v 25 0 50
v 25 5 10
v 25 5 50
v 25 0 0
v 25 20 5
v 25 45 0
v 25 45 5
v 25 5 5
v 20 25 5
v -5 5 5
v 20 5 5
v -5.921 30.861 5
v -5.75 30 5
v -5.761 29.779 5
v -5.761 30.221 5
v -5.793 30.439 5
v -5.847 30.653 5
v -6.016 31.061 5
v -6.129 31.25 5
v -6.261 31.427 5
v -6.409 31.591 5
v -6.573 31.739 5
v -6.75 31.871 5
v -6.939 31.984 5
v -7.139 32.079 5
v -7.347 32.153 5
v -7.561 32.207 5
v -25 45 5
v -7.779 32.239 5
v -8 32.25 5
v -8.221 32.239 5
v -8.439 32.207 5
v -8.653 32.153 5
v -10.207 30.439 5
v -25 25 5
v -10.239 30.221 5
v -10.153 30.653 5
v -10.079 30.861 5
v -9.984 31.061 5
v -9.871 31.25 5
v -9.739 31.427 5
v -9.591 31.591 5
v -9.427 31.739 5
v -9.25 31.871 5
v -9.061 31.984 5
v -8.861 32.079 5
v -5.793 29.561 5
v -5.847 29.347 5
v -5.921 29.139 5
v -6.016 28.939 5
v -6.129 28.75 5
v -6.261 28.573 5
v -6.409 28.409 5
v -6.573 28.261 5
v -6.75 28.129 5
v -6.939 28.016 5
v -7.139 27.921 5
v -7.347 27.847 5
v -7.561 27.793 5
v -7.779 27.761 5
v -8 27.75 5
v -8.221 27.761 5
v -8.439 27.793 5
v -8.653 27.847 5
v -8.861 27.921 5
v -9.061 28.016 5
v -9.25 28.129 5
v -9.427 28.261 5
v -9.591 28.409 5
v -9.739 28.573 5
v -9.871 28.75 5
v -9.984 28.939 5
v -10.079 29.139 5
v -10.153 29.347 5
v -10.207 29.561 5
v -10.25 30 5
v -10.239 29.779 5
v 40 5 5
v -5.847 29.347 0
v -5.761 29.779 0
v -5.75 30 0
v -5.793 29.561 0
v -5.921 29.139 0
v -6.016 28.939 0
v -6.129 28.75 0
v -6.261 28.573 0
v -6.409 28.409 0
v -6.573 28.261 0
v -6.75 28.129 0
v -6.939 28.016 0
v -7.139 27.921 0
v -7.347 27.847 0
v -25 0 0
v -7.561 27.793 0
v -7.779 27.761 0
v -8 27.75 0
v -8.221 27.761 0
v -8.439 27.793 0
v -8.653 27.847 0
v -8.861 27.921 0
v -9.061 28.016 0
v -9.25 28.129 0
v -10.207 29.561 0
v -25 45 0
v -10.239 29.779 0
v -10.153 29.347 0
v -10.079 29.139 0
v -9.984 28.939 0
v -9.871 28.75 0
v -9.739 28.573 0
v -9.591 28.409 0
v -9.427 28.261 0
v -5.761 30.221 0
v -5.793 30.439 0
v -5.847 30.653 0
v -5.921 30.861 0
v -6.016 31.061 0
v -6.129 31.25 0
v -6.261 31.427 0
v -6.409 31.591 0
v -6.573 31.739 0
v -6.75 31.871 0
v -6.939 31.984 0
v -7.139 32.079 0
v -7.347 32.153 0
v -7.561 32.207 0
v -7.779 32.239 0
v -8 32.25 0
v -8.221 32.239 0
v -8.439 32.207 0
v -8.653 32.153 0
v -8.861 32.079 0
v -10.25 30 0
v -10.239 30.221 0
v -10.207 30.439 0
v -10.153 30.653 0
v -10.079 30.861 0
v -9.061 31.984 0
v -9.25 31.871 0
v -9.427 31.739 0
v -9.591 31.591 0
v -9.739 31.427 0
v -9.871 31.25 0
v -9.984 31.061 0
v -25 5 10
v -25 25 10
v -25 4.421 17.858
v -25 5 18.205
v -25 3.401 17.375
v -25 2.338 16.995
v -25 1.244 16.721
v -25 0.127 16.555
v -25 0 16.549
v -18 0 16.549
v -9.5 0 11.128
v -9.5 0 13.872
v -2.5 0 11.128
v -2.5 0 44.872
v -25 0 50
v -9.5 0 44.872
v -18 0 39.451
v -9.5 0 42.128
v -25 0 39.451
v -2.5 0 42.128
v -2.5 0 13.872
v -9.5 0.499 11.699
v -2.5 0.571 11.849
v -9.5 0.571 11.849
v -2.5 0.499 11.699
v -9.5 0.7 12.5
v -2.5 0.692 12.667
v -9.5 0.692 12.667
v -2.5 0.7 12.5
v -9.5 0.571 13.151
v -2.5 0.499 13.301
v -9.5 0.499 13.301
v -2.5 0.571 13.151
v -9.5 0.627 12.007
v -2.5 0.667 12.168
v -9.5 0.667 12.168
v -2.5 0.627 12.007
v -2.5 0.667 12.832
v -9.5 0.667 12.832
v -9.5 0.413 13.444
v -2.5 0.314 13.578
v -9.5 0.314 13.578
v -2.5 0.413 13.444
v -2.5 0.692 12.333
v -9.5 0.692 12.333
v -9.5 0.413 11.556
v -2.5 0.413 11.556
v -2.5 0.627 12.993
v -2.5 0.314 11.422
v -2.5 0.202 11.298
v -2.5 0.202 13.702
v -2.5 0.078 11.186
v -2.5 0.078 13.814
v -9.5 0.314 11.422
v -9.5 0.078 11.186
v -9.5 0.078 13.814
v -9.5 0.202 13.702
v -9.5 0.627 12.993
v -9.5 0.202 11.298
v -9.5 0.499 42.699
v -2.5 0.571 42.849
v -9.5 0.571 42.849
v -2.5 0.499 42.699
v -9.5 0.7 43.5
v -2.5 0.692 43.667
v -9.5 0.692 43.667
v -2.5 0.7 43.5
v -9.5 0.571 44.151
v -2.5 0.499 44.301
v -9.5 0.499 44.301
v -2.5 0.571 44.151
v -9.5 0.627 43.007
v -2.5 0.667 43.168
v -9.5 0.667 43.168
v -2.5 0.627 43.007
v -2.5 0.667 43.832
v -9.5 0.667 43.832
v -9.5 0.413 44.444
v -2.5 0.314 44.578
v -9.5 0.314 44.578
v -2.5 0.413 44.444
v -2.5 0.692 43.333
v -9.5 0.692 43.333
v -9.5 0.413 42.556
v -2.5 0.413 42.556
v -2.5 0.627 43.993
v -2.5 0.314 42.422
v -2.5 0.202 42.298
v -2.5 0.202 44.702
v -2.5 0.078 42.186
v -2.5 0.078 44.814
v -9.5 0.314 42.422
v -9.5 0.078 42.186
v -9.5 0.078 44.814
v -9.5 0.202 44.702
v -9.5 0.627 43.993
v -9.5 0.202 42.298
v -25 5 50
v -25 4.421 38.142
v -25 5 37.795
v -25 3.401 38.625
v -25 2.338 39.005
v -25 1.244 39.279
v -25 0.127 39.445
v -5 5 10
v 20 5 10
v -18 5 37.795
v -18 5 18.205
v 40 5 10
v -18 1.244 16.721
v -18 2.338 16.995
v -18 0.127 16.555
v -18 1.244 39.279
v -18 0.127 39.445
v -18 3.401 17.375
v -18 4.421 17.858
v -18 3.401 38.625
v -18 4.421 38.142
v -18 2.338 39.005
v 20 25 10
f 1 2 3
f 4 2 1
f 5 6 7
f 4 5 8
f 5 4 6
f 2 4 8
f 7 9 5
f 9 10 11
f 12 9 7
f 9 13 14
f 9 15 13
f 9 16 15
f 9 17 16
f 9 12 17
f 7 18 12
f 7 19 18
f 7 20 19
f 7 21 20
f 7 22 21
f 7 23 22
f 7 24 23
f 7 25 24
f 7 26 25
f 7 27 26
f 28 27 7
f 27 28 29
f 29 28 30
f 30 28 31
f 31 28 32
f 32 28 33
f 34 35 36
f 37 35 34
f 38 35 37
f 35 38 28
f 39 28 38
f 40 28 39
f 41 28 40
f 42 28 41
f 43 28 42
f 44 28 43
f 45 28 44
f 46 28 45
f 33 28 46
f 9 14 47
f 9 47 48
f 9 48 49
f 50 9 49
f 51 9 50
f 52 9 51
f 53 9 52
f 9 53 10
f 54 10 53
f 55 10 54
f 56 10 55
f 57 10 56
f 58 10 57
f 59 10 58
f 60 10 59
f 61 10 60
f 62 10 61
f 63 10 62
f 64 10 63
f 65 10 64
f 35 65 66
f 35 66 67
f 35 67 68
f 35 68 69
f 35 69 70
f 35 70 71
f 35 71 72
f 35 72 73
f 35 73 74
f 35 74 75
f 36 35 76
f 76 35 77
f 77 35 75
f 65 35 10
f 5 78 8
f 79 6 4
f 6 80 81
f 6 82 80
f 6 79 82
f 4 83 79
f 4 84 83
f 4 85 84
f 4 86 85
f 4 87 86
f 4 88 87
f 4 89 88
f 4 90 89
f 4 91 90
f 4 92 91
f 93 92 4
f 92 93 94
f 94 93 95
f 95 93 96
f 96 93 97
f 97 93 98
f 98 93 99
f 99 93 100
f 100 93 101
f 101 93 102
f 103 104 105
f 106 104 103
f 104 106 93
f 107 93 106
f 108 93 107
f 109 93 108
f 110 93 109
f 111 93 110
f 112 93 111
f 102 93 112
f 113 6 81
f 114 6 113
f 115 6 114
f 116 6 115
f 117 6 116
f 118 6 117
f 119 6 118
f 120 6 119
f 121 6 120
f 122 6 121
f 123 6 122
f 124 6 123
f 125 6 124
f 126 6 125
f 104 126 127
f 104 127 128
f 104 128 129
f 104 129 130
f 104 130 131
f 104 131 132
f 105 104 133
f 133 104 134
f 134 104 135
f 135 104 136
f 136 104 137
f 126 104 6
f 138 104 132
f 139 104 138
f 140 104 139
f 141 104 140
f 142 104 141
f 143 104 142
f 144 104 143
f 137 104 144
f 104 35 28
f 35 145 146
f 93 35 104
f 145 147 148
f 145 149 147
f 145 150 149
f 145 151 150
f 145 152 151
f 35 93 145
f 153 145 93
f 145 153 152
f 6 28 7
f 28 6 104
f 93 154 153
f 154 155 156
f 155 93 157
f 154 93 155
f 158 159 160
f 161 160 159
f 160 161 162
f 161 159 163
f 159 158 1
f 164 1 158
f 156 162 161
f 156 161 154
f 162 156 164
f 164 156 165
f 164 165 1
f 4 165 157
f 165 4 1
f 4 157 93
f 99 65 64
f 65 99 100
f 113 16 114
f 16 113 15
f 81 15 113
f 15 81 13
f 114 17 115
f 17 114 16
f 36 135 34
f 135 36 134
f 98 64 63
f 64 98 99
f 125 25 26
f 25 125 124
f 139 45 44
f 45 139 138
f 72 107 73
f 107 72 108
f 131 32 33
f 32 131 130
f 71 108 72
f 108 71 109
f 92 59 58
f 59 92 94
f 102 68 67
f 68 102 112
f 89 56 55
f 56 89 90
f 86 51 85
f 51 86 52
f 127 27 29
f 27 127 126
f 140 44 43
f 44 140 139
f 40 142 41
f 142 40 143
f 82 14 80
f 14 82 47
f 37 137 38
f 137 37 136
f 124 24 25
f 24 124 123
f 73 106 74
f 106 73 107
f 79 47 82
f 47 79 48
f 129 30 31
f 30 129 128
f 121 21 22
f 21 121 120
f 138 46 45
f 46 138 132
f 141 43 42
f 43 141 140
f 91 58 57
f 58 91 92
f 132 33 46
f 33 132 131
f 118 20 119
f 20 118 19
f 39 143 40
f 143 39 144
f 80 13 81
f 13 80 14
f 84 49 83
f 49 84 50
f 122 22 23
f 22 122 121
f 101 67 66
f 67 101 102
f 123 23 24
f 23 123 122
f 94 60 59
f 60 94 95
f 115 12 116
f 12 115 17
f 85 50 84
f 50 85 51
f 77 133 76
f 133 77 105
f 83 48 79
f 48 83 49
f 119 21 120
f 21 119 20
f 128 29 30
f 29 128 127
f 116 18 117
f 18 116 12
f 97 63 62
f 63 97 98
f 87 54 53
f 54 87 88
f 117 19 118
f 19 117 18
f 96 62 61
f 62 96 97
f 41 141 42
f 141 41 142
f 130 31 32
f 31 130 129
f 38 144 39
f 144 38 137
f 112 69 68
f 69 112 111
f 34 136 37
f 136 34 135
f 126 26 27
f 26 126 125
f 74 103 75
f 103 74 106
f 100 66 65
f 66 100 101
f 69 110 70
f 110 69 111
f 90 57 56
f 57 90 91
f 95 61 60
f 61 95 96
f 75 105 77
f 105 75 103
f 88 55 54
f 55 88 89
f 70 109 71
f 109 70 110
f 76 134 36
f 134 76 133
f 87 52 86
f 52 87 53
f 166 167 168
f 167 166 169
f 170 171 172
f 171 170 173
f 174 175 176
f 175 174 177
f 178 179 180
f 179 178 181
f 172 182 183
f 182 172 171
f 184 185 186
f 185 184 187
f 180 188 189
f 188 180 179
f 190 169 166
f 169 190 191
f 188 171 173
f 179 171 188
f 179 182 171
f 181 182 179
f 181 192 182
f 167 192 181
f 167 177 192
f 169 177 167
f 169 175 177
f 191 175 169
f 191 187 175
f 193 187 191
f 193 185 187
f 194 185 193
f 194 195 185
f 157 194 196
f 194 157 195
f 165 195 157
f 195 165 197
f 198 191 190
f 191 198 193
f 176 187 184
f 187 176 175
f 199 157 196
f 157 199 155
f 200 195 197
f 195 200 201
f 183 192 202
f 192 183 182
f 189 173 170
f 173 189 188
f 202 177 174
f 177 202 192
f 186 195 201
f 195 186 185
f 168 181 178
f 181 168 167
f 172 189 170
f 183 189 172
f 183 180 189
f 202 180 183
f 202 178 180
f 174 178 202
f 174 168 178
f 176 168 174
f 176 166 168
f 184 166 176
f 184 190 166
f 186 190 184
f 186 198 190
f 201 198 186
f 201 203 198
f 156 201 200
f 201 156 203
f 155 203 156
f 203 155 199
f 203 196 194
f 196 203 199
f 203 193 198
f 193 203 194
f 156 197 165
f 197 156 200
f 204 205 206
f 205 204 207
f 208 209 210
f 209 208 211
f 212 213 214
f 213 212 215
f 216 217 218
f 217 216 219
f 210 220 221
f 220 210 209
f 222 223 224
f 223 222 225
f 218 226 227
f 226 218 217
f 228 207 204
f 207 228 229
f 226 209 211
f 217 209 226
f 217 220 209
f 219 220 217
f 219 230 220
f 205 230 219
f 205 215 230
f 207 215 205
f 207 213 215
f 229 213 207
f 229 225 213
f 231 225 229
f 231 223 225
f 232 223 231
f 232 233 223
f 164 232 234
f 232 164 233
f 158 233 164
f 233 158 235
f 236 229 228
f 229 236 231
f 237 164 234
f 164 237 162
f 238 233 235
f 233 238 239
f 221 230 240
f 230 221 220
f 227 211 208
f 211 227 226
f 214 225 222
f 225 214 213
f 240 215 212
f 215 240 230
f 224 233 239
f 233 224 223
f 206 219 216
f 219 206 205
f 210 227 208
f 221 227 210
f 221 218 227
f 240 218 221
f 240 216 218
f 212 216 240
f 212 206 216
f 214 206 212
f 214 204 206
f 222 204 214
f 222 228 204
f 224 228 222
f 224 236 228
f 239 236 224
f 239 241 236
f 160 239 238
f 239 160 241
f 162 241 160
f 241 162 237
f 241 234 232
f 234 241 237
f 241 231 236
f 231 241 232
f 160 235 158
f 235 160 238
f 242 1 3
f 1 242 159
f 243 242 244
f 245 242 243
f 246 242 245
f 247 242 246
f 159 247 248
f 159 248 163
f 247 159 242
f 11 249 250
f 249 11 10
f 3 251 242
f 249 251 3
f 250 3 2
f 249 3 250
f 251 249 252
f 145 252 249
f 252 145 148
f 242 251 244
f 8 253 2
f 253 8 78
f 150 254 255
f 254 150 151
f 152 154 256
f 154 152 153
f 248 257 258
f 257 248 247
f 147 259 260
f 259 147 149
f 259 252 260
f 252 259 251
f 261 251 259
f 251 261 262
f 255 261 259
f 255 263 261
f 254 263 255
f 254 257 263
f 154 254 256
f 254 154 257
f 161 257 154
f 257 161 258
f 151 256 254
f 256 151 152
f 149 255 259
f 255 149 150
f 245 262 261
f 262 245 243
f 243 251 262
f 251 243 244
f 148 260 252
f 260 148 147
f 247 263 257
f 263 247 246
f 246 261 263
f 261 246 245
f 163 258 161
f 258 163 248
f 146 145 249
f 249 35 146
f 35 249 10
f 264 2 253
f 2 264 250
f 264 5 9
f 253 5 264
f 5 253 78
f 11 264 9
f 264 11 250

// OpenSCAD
// NEMA 17 Stepper Motor L-Bracket for Syringe Pump
// Corrected to match exact dimensions and centering requirements

// --- Dimensions ---
// Base Plate
base_x_min = -25;
base_x_max = 25;
base_y_min = 0;
base_y_max = 45;
base_z_height = 5;

// Base Plate Holes (M4)
m4_hole_dia = 4.5;
m4_hole_x1 = -17;
m4_hole_x2 = 17;
m4_hole_y = 30;

// Vertical Motor Plate
motor_plate_x_min = -25;
motor_plate_x_max = 25;
motor_plate_y_max = 5;
motor_plate_z_max = 50;

// Motor Boss Hole (Centering)
boss_hole_dia = 23;
boss_hole_x = 0;
boss_hole_z = 28;

// Motor Screw Holes (M3)
m3_hole_dia = 3.4;
m3_pattern_size = 31;
m3_offset = m3_pattern_size / 2;

// Gussets
gusset_thickness = 5;
gusset_leg_y = 20;
gusset_leg_z = 20;

// Resolution
$fn = 64;

// --- Construction ---

module base_plate() {
    difference() {
        // Main Base Body
        // X: -25 to 25 (width 50), Y: 0 to 45 (depth 45), Z: 0 to 5
        cube([base_x_max - base_x_min, base_y_max - base_y_min, base_z_height]);
        
        // M4 Holes (Vertical through-holes)
        // Holes are at x = -17 and x = 17, y = 30
        translate([m4_hole_x1, m4_hole_y, -1])
            cylinder(d = m4_hole_dia, h = base_z_height + 2);
        translate([m4_hole_x2, m4_hole_y, -1])
            cylinder(d = m4_hole_dia, h = base_z_height + 2);
    }
}

module motor_plate() {
    difference() {
        // Main Vertical Plate Body
        // X: -25 to 25 (width 50), Y: 0 to 5 (depth 5), Z: 0 to 50
        cube([motor_plate_x_max - motor_plate_x_min, motor_plate_y_max, motor_plate_z_max]);
        
        // Motor Centering Boss Hole (Cylinder along Y axis)
        // Center at x=0, z=28. Extends through the plate (y=0 to 5)
        translate([boss_hole_x, -1, boss_hole_z])
            rotate([0, 90, 0])
            cylinder(d = boss_hole_dia, h = motor_plate_y_max + 2);
            
        // M3 Screw Holes (4 holes in a square pattern)
        // Pattern is centered on the boss hole (x=0, z=28)
        for (px = [-m3_offset, m3_offset]) {
            for (pz = [-m3_offset, m3_offset]) {
                translate([px, -1, boss_hole_z + pz])
                    rotate([0, 90, 0])
                    cylinder(d = m3_hole_dia, h = motor_plate_y_max + 2);
            }
        }
    }
}

// --- Final Assembly ---

union() {
    // 1. Base Plate
    // Centered on X (width 50), Y starts at 0
    translate([base_x_min, base_y_min, 0])
    base_plate();

    // 2. Vertical Motor Plate
    // Positioned at the back edge (y=0 to 5)
    // Centered on X (width 50)
    translate([motor_plate_x_min, 0, 0])
    motor_plate();

    // 3. Gussets
    // Left Gusset: x from -25 to -20
    // Right Gusset: x from 20 to 25
    // Right-angle corner at y=5, z=5
    // Legs: 20mm along +Y and 20mm along +Z
    
    // Left Gusset
    translate([-25, 5, 5])
    linear_extrude(height = gusset_thickness)
    polygon(points=[
        [0, 0],
        [gusset_leg_y, 0],
        [0, gusset_leg_z]
    ]);
    
    // Right Gusset
    translate([20, 5, 5])
    linear_extrude(height = gusset_thickness)
    polygon(points=[
        [0, 0],
        [gusset_leg_y, 0],
        [0, gusset_leg_z]
    ]);
}
